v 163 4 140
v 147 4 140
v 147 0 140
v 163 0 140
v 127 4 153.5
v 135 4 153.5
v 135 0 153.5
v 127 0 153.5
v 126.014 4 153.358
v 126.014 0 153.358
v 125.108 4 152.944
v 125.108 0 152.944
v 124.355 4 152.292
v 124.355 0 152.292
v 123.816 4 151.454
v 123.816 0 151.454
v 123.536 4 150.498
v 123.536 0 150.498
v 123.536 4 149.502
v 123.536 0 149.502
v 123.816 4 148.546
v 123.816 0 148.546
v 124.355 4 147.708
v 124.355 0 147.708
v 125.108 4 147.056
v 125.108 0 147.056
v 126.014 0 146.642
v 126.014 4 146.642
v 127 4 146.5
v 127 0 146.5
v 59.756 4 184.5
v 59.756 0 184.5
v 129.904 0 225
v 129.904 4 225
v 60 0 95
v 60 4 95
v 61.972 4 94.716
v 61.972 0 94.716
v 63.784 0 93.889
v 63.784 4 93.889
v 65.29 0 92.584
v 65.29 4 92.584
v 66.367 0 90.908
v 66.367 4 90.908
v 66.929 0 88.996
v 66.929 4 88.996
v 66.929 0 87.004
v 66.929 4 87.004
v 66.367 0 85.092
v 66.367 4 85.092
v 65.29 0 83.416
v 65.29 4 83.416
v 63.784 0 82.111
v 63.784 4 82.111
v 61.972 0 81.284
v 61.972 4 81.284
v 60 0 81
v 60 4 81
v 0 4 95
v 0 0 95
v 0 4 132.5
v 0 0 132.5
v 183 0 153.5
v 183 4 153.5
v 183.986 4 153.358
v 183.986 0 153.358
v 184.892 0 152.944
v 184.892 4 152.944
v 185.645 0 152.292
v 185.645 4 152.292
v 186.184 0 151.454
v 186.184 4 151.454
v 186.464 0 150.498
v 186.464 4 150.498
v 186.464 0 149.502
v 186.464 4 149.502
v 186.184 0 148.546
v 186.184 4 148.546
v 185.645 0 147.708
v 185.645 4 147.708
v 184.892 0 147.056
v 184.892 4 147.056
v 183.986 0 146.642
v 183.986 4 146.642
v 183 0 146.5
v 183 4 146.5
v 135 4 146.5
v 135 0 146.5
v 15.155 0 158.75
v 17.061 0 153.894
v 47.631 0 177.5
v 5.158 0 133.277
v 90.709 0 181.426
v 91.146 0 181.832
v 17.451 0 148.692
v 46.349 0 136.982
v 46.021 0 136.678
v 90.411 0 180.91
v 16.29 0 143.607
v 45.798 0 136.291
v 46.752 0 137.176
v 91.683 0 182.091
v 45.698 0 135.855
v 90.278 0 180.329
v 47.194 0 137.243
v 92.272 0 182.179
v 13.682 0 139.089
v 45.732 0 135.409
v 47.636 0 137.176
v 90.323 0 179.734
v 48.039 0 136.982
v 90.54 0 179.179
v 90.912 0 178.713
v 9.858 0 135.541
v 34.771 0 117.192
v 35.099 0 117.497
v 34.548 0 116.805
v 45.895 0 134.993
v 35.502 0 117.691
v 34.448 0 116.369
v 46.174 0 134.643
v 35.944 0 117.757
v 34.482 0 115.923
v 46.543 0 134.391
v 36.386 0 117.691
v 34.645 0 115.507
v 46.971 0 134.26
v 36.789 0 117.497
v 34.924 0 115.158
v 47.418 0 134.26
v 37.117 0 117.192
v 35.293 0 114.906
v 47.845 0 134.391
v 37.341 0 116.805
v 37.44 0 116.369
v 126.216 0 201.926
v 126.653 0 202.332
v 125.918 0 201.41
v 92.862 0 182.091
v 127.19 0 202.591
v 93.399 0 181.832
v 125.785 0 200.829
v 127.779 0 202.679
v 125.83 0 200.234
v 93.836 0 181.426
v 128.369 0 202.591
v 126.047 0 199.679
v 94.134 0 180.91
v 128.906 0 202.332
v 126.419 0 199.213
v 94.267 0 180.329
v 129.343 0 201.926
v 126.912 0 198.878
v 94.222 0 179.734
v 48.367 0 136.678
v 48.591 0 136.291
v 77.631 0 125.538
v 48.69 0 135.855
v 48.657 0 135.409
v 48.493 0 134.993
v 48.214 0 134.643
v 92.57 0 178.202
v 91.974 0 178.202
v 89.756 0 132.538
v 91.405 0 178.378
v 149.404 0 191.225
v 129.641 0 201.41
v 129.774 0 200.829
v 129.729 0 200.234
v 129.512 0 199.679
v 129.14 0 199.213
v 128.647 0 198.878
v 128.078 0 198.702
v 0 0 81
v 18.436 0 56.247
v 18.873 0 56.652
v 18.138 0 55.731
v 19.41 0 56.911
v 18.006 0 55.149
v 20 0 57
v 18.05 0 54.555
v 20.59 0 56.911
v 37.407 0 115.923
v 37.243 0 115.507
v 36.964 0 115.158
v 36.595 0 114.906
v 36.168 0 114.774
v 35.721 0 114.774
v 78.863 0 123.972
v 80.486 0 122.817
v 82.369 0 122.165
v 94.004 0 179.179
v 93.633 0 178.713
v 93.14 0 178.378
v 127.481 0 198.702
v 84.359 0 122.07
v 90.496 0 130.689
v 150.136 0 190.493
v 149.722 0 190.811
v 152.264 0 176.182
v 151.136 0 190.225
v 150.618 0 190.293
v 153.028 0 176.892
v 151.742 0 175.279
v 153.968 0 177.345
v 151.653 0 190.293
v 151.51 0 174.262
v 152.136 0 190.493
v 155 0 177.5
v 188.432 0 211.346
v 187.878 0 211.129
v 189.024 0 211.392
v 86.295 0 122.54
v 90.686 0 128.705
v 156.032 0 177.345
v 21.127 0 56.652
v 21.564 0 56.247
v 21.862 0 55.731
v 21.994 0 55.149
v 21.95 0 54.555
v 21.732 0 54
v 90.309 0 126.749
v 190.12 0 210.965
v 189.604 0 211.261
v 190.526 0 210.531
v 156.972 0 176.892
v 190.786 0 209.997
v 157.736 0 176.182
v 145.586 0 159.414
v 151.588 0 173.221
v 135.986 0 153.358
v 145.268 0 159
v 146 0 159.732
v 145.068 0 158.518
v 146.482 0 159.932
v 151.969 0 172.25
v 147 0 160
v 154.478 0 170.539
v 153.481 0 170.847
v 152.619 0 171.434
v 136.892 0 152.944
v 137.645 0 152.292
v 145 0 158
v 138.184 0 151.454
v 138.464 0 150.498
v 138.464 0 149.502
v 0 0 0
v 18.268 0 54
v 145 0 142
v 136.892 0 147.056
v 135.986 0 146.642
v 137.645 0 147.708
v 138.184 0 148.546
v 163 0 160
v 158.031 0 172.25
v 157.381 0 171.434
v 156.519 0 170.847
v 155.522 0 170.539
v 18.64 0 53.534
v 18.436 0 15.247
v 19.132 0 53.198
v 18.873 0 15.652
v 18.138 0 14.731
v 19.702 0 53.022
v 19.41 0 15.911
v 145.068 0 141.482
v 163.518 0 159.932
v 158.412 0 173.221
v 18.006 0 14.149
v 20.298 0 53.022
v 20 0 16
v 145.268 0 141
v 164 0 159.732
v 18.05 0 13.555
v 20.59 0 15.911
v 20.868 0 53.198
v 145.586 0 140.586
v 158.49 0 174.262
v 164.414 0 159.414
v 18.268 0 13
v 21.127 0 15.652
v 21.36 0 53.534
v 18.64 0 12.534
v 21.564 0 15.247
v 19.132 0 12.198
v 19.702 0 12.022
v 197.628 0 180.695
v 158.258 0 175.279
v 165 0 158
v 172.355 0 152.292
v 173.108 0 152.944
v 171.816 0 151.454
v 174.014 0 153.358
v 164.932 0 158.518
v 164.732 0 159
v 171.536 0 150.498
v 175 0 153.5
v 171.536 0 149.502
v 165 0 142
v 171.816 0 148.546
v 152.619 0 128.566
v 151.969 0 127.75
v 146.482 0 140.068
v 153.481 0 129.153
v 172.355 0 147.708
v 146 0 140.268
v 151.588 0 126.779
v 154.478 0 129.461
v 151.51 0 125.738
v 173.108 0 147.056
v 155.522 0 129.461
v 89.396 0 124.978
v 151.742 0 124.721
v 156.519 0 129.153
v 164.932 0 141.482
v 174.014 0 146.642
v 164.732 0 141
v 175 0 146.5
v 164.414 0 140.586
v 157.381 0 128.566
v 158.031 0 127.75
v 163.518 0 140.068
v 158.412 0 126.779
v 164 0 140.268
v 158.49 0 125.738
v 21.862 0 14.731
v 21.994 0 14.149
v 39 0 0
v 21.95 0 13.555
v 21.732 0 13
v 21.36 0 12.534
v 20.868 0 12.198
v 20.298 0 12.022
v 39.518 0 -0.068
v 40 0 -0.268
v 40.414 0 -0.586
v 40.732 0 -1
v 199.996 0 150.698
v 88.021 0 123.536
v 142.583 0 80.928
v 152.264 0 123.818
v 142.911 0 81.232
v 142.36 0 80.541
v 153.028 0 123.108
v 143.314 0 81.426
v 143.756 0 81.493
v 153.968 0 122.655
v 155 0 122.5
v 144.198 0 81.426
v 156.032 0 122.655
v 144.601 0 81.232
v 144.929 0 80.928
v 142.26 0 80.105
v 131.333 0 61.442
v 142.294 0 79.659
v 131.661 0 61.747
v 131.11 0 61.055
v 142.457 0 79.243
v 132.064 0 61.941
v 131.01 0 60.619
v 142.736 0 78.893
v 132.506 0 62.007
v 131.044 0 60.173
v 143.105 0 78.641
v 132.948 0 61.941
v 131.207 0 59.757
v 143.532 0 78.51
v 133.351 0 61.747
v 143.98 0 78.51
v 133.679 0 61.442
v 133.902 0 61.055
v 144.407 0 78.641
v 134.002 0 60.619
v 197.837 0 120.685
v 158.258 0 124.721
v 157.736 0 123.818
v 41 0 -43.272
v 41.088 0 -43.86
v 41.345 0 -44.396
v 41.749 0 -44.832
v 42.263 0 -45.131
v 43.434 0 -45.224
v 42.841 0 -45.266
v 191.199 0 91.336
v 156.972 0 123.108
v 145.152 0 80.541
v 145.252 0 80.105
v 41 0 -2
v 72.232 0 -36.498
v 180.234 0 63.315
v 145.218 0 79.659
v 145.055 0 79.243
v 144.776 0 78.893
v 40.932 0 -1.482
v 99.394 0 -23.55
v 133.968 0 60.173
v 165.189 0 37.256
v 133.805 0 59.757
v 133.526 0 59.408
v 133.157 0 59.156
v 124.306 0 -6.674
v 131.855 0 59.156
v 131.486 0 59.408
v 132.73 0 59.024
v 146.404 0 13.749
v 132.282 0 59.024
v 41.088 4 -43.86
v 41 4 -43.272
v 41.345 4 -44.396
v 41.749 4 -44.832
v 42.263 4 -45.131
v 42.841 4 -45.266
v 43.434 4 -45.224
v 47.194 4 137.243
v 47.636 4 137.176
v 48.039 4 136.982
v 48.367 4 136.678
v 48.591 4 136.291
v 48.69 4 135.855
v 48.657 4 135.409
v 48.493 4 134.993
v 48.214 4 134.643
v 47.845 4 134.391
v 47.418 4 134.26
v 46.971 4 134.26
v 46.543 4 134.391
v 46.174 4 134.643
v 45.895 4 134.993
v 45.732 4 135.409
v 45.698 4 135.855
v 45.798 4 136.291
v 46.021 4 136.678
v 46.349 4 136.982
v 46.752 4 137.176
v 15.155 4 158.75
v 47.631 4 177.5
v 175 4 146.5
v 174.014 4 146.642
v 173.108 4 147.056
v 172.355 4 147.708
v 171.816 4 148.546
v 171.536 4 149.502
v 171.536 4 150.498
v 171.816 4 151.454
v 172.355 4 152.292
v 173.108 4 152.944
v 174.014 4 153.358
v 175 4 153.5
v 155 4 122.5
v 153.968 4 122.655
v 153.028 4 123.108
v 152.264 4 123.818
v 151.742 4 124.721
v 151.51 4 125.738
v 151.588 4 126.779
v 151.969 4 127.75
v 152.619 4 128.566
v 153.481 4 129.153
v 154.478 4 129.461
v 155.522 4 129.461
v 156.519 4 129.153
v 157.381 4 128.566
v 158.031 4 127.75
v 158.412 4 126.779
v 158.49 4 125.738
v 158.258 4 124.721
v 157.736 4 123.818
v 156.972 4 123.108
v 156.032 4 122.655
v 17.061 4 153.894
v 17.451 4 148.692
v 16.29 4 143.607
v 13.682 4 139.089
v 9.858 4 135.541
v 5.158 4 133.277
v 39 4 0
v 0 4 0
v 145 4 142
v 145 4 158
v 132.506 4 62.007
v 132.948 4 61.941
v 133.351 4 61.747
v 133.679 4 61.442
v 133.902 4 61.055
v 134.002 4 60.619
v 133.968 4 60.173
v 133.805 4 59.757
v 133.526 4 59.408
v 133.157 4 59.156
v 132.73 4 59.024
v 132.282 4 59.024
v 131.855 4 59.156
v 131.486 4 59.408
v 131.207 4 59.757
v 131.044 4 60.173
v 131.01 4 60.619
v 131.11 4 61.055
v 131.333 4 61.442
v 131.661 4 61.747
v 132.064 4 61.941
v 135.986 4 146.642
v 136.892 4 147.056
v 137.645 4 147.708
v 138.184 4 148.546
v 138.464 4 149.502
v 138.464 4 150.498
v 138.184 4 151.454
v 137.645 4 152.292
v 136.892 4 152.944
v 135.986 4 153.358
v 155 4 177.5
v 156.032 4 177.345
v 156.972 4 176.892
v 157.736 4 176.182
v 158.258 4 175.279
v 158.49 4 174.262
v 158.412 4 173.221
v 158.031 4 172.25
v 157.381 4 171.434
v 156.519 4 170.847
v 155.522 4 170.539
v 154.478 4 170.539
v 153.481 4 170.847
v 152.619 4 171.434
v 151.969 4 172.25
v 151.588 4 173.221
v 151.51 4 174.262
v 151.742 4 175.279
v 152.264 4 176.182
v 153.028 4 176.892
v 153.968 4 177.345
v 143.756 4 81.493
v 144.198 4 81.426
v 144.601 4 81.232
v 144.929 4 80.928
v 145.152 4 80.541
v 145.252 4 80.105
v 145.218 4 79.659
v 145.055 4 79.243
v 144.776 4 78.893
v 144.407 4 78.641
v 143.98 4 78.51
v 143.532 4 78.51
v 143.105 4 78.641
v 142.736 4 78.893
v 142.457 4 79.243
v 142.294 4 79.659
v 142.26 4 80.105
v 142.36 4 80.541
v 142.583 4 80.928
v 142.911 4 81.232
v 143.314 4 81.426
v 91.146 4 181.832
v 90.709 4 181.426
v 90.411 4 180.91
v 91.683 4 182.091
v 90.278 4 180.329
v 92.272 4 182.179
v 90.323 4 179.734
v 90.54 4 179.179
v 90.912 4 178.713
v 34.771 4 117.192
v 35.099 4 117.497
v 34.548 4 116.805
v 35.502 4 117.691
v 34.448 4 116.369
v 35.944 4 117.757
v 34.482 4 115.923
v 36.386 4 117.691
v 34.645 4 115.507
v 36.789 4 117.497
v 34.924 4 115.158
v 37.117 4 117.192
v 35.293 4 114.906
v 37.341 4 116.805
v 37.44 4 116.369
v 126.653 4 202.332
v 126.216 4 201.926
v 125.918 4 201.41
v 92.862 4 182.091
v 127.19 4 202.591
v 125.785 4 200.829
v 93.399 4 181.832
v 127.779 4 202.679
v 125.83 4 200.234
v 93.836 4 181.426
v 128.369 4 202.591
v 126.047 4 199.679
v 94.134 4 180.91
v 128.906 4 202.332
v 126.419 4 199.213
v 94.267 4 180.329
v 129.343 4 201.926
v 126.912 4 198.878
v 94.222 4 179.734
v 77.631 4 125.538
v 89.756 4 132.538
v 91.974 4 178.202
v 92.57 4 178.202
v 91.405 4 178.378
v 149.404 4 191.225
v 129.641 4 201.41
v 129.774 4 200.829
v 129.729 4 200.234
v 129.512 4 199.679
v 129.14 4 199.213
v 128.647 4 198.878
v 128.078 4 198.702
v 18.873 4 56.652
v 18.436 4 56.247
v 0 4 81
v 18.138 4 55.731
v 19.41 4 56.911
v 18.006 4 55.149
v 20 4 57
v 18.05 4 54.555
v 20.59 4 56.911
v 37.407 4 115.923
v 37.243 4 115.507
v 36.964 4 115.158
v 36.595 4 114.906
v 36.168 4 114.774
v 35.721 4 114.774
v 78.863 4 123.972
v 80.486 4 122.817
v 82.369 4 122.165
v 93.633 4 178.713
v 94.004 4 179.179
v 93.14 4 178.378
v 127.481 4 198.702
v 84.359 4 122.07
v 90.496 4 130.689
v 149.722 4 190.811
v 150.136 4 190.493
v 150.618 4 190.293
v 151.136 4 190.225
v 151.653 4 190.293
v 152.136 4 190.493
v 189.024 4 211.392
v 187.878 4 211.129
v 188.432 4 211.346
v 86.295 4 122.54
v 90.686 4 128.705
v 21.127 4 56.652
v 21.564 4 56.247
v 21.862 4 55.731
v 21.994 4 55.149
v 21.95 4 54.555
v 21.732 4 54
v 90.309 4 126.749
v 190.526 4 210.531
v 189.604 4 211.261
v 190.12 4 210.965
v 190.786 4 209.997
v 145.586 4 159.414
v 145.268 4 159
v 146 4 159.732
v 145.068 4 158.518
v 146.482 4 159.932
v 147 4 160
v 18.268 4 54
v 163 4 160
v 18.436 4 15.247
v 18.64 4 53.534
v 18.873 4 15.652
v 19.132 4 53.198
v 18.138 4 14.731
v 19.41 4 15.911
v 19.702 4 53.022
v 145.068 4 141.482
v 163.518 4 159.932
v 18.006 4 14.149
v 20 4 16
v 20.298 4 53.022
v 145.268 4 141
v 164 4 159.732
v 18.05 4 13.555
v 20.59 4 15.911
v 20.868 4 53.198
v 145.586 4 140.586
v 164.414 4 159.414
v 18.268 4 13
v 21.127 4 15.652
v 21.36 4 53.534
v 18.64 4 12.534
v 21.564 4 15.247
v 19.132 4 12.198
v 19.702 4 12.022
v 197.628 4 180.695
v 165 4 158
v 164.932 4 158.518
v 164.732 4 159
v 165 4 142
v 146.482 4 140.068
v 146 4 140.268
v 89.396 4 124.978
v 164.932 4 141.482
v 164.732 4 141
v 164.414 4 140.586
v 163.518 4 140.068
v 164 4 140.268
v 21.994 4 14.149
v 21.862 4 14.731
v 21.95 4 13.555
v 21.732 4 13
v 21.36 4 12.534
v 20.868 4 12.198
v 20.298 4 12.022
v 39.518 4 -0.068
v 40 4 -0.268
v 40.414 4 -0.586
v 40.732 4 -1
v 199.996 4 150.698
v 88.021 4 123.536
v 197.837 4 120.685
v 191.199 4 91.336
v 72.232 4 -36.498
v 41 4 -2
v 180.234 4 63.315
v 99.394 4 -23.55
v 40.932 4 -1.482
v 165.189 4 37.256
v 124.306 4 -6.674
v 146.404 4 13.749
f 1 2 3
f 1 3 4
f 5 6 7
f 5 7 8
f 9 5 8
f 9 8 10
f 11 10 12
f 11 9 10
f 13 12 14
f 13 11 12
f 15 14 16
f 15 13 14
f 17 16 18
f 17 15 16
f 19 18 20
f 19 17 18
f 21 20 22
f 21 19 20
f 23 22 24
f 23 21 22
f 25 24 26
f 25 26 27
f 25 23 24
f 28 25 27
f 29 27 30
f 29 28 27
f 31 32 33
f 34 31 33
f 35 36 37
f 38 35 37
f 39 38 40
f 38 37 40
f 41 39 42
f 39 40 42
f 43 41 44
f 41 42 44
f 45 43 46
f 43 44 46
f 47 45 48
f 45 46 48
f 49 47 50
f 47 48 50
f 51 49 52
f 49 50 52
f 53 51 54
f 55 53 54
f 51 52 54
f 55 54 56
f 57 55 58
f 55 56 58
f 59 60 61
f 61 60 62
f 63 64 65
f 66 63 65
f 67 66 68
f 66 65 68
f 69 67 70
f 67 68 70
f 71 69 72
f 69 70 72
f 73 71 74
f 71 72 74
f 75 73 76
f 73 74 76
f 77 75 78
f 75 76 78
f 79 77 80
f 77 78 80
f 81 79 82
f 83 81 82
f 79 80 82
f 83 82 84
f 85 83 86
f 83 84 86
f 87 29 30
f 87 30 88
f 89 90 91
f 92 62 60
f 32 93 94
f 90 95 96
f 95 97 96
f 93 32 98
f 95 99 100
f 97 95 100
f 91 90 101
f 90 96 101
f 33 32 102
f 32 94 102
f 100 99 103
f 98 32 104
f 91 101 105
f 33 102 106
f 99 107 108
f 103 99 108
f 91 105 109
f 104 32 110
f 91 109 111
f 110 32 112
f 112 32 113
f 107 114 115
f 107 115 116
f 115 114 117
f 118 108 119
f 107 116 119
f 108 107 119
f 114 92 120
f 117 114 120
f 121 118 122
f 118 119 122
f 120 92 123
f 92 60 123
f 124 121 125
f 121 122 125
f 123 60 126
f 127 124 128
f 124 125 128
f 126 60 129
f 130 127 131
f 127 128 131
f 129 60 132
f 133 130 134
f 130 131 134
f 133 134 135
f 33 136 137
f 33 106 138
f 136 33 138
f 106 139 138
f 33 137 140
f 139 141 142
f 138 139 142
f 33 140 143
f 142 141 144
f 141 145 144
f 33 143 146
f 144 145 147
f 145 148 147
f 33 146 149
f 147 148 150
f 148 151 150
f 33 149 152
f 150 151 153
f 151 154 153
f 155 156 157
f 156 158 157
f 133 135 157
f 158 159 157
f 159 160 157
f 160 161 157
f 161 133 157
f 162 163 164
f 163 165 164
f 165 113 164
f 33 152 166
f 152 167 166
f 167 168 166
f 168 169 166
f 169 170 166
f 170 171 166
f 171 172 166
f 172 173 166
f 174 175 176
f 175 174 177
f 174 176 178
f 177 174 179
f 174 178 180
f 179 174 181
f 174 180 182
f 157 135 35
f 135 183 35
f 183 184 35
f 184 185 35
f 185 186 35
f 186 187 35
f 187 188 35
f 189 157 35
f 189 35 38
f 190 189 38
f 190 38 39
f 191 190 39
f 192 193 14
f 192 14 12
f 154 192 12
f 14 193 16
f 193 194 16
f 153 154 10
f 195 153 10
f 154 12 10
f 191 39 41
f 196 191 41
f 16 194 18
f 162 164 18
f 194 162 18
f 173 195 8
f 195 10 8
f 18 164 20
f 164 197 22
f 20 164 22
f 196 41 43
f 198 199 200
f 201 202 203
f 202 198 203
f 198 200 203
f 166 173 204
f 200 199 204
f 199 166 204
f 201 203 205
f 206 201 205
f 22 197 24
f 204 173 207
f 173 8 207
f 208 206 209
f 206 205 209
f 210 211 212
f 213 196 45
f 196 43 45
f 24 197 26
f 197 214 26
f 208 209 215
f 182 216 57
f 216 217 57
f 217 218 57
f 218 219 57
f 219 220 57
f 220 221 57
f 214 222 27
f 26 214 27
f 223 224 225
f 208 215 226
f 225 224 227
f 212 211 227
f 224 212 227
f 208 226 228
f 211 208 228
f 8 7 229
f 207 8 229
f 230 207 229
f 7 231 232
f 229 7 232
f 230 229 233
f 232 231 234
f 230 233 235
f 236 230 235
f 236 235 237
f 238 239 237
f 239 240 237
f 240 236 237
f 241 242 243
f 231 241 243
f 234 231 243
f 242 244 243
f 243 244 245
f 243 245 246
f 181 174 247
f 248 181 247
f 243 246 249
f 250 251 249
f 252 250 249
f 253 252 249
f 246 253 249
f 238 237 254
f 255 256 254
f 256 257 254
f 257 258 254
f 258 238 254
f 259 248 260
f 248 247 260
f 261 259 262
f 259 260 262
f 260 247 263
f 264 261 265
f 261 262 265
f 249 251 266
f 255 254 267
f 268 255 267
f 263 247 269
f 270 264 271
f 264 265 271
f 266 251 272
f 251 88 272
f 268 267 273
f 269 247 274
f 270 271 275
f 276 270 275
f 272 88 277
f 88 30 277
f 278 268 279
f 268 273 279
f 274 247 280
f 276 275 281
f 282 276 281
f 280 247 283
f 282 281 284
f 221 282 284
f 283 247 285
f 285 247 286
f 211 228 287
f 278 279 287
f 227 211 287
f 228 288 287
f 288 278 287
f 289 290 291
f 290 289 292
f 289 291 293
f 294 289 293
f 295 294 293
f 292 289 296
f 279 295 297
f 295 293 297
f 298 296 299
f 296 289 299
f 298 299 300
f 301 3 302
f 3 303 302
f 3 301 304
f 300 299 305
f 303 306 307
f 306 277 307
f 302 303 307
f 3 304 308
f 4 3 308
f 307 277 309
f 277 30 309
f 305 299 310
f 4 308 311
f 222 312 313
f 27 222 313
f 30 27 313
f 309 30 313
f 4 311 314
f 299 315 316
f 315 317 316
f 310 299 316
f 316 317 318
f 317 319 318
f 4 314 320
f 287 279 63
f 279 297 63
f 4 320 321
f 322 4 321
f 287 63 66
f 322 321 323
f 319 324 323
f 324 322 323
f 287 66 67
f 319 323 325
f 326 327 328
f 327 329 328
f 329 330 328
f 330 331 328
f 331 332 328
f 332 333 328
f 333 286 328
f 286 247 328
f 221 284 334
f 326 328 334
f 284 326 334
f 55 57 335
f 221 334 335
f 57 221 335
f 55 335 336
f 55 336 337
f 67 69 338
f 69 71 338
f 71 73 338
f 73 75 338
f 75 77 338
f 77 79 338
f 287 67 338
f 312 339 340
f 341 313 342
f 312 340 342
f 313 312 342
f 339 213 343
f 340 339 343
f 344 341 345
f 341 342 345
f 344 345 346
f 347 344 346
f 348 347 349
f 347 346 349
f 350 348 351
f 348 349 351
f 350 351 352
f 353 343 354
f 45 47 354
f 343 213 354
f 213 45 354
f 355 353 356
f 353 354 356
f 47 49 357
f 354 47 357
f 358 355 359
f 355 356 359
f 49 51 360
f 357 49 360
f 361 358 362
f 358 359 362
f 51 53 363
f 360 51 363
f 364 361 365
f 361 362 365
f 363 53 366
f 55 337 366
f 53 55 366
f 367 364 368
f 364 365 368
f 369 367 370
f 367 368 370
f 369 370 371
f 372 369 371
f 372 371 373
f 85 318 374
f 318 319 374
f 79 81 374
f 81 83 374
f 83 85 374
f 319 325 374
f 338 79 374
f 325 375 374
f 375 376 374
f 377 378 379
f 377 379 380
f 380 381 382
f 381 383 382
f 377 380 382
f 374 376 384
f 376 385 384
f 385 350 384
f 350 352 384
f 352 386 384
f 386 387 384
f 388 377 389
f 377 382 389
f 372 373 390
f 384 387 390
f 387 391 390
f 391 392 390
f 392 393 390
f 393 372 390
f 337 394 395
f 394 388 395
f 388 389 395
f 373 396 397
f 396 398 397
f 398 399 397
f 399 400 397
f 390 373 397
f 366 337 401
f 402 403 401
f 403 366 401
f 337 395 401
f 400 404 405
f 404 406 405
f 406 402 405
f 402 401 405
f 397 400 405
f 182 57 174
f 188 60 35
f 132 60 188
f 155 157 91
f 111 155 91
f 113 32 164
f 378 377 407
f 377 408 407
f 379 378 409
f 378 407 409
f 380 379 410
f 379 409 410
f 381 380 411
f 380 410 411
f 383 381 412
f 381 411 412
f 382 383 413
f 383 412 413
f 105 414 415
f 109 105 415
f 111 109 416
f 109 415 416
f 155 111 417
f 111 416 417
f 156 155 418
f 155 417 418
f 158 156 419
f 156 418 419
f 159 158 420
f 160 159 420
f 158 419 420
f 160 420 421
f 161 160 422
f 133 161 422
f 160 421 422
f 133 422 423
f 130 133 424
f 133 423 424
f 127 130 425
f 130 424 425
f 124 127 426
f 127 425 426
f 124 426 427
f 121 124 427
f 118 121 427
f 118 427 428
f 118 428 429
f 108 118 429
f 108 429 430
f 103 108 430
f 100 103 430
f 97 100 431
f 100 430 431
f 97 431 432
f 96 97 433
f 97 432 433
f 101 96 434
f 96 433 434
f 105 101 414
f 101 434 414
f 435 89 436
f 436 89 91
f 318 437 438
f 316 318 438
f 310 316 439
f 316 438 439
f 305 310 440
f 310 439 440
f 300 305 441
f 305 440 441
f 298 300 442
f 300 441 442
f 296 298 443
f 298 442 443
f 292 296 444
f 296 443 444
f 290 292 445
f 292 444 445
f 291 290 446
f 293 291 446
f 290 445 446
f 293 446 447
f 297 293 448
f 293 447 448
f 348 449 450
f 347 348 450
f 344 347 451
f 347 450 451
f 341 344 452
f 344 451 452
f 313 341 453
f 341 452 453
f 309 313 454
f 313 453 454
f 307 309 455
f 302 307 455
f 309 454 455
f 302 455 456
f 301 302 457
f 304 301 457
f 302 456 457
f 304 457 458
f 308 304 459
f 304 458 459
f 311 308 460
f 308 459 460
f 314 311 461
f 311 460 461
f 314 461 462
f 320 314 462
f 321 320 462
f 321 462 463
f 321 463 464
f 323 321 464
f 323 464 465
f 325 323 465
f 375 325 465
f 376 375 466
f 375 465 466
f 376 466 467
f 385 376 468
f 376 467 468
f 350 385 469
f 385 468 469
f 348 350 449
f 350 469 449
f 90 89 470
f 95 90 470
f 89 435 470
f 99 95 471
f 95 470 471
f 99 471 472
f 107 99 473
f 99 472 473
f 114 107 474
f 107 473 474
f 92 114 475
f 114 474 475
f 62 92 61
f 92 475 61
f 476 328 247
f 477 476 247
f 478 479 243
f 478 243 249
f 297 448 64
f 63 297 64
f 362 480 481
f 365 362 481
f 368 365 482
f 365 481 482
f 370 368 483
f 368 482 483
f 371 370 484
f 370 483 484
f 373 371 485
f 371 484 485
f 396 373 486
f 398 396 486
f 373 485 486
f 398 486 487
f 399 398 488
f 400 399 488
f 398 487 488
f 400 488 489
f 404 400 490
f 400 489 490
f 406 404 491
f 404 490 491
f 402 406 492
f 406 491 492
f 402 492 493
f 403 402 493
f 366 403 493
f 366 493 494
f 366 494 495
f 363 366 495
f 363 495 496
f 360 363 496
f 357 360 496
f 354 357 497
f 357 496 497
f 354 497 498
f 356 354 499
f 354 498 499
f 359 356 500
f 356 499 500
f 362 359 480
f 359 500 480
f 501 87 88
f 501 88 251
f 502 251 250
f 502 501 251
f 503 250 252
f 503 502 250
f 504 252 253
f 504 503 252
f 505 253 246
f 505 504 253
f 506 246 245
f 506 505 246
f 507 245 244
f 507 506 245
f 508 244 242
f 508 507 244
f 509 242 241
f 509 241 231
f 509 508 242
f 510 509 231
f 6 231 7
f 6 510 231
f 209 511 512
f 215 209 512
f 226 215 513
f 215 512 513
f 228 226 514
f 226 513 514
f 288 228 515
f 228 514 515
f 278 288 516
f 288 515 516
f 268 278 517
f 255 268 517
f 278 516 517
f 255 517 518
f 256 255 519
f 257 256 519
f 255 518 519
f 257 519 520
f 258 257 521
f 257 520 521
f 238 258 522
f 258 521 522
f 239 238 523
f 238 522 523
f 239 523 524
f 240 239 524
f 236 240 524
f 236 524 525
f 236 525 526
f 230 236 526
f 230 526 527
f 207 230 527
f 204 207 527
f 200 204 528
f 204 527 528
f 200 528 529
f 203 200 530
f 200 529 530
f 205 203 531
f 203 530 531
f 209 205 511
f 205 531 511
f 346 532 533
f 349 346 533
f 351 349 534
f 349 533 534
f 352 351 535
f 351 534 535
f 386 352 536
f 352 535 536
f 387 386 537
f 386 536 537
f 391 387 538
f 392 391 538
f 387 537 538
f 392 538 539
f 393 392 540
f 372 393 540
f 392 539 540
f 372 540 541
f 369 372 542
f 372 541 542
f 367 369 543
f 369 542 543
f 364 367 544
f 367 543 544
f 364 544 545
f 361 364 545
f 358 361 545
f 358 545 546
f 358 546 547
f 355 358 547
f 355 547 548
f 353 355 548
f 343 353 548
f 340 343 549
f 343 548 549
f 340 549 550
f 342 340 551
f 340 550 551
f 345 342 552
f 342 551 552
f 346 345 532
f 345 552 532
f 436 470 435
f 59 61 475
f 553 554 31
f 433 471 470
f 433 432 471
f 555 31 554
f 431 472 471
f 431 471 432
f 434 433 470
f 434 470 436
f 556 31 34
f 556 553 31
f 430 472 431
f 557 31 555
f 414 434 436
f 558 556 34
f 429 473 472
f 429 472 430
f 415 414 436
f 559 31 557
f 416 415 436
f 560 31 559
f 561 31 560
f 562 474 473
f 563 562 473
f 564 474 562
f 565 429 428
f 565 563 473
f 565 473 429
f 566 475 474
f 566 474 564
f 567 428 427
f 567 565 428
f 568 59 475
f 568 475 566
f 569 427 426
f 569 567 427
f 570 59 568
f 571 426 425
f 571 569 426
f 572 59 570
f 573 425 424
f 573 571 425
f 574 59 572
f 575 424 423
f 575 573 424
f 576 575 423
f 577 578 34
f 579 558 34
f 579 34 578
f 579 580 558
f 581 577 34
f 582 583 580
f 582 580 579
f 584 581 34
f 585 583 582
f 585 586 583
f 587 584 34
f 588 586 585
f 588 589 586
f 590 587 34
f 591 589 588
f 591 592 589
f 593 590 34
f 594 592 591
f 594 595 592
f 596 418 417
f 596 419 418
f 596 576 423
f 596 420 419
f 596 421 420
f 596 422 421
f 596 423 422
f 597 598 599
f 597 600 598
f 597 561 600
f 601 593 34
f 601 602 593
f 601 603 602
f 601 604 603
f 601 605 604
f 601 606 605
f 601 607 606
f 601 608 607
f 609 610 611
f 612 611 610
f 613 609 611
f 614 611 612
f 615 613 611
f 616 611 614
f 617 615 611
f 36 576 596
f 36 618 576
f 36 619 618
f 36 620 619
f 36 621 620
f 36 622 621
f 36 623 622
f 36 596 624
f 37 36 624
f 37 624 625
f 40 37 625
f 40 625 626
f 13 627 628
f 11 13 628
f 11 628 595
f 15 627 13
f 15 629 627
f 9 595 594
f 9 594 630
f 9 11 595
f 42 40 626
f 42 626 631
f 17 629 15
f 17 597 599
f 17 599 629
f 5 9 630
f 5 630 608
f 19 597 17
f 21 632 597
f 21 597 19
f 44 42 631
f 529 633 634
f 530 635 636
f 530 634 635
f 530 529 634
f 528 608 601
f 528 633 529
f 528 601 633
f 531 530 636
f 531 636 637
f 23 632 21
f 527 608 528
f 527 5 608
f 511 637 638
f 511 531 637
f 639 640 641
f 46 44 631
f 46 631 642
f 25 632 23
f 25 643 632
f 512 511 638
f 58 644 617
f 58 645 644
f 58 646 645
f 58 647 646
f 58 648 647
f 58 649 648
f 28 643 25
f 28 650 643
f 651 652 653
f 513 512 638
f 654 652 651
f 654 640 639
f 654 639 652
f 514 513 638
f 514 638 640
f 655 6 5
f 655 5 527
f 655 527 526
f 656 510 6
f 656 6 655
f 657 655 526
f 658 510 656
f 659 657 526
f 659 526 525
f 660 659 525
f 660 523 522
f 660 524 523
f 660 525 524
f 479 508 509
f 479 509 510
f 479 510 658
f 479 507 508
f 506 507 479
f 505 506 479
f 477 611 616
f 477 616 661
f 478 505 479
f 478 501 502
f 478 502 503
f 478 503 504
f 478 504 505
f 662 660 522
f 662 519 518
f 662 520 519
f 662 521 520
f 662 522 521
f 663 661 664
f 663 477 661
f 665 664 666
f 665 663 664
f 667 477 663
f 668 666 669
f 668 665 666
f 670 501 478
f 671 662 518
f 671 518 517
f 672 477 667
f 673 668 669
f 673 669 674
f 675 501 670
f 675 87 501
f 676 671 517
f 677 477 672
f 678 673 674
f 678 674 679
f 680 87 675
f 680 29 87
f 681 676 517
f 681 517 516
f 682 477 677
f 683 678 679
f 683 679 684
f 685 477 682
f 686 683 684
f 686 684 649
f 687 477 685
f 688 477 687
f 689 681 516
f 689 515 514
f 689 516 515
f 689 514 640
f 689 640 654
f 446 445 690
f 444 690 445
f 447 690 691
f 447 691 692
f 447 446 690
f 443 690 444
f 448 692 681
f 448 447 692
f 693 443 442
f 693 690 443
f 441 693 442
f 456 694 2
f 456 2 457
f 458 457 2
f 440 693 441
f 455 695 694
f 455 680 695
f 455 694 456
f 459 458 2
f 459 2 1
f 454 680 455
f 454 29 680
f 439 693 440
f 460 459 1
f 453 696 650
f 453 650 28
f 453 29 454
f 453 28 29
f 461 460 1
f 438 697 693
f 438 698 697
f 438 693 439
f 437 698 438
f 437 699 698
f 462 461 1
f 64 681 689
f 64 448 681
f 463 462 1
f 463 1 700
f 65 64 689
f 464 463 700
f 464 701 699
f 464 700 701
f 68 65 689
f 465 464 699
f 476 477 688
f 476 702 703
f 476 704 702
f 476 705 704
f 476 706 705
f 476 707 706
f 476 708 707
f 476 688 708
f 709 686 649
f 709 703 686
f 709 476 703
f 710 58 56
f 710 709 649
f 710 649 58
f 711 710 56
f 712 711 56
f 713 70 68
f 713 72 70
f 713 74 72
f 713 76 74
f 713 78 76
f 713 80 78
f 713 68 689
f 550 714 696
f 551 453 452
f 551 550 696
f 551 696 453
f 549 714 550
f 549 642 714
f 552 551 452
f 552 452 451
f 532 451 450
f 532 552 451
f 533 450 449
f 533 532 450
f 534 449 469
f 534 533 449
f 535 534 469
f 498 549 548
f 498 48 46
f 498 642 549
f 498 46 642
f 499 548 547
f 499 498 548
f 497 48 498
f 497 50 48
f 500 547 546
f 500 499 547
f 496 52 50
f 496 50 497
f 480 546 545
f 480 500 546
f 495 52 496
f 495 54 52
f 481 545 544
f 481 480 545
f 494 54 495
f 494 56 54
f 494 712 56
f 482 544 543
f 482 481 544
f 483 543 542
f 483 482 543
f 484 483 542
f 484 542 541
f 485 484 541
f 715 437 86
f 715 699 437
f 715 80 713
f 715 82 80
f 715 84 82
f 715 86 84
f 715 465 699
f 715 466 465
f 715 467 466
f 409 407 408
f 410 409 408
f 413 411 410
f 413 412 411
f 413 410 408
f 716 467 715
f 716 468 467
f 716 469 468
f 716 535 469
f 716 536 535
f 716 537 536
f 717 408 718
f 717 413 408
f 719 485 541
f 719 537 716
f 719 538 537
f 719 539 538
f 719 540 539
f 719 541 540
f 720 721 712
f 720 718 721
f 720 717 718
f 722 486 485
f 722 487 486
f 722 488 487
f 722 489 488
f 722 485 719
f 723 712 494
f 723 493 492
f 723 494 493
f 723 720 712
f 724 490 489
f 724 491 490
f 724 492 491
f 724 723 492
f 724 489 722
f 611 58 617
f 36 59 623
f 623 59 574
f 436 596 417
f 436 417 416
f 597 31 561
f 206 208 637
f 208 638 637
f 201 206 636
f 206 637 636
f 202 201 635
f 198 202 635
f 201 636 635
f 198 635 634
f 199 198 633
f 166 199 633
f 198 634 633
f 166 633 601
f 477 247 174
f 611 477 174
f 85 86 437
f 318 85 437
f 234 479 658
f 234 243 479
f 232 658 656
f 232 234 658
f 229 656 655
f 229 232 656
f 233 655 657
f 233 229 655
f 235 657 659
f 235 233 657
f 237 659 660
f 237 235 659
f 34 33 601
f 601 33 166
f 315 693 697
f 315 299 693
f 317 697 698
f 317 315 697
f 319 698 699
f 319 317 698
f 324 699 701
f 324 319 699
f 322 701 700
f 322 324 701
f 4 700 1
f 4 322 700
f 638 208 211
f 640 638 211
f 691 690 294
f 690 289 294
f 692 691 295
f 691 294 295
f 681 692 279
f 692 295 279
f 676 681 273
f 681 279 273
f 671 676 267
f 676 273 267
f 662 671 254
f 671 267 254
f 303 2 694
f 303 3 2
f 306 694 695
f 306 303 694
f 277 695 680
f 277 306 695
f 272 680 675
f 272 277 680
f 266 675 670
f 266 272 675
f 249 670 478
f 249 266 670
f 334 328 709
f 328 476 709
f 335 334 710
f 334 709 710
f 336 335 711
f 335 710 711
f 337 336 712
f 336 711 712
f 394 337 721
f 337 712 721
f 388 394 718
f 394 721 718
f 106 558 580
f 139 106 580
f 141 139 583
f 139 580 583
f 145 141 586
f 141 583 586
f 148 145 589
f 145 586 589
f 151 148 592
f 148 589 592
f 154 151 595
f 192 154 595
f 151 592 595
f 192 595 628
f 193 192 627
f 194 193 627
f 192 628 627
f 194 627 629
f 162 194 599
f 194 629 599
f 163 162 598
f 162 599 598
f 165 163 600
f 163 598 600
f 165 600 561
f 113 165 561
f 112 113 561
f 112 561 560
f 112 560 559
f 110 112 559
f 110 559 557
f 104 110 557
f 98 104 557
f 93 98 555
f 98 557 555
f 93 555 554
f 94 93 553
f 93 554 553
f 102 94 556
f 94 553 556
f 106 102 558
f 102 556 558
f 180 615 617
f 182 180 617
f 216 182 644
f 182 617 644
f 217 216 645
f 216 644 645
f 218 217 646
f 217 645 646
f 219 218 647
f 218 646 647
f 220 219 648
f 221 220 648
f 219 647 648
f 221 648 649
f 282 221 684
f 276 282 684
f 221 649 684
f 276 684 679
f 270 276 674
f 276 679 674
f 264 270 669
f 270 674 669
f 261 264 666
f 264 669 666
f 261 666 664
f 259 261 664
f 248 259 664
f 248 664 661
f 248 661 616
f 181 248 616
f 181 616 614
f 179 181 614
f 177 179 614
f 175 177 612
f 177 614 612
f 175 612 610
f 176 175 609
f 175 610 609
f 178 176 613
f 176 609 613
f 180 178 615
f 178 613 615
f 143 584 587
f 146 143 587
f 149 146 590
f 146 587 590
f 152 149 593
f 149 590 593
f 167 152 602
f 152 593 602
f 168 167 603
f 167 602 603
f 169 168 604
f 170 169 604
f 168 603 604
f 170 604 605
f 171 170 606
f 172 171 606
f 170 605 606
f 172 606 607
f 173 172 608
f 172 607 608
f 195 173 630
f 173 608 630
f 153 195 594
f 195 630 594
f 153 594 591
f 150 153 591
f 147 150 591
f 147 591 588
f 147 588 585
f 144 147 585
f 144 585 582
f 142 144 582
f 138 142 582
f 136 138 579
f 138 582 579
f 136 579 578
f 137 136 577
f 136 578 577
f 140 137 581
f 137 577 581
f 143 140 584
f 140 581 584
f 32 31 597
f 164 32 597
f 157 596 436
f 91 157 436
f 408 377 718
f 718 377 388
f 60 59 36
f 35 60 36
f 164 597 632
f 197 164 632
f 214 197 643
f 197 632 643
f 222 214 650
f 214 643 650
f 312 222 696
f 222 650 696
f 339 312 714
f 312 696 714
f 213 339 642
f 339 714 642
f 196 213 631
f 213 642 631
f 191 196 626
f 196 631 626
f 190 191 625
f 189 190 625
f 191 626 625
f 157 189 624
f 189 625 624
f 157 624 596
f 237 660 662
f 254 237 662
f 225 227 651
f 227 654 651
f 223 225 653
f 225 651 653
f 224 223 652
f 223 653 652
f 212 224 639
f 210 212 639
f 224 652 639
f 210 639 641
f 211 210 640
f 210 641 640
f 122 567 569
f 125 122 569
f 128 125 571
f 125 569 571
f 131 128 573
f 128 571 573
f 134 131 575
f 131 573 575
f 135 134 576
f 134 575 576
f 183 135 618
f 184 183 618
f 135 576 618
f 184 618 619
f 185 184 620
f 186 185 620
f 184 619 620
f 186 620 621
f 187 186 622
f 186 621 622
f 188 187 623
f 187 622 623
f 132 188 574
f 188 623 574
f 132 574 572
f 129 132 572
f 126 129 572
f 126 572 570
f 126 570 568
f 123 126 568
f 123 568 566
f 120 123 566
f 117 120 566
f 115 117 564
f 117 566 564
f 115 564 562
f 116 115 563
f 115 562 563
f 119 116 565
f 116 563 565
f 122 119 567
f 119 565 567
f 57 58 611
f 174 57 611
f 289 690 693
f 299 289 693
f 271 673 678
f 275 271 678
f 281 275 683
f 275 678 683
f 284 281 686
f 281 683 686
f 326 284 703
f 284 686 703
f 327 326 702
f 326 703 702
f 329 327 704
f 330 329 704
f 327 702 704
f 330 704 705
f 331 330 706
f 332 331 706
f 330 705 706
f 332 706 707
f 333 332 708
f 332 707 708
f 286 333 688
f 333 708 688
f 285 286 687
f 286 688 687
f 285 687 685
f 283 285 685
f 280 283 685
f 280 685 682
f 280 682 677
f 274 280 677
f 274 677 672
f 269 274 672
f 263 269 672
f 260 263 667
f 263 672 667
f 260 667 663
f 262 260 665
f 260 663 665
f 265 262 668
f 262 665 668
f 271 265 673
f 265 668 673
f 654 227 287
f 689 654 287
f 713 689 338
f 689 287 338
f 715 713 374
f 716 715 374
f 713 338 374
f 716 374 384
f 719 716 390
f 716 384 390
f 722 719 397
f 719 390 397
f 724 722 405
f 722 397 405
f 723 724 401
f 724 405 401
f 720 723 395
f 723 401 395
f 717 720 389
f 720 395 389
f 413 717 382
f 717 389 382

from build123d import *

# Parameters (mm, degrees)
BOSS_EXTRUDE1_DEPTH = 4
SKETCH2_R           = 2
CUT_EXTRUDE1_DEPTH  = 4
SKETCH3_R           = 1.5
CUT_EXTRUDE2_DEPTH  = 4
CUT_EXTRUDE3_DEPTH  = 4
SKETCH5_R           = 2
CUT_EXTRUDE4_DEPTH  = 4
SKETCH6_R           = 3.5
SKETCH6_W           = 20
SKETCH6_H           = 20
CUT_EXTRUDE5_DEPTH  = 4
CUT_EXTRUDE6_DEPTH  = 4
SKETCH9_R           = 17.5
CUT_EXTRUDE7_DEPTH  = 4
FILLET1_R           = 2


with BuildPart() as part:
    # Sketch1 → Boss-Extrude1 (new body)
    with BuildSketch(Plane(origin=(0, 0, 0), x_dir=(1, 0, 0), z_dir=(0, 1, 0))):
        with BuildLine():
            Line((0, 0), (0, -150))
            Line((0, -150), (129.903810568, -225))
            Line((129.903810568, -225), (150.403810568, -189.492958445))
            Line((150.403810568, -189.492958445), (190.024472791, -212.367958445))
            ThreePointArc((190.024472791, -212.367958445), (173.202037288, -50.001757147), (41, 45.75))
            Line((41, 45.75), (41, 0))
            Line((41, 0), (0, 0))
        make_face()
    extrude(amount=BOSS_EXTRUDE1_DEPTH)

    # Sketch2 → Cut-Extrude1 (cut)
    with BuildSketch(Plane(origin=(0, 4, 0), x_dir=(1, 0, 0), z_dir=(0, 1, 0))):
        with Locations(Location((20, -14, 0), (0, 0, 270))):
            Circle(SKETCH2_R)
        with Locations(Location((20, -55, 0), (0, 0, 270))):
            Circle(SKETCH2_R)
    extrude(amount=-CUT_EXTRUDE1_DEPTH, mode=Mode.SUBTRACT)

    # Sketch3 → Cut-Extrude2 (cut)
    with BuildSketch(Plane(origin=(0, 4, 0), x_dir=(1, 0, 0), z_dir=(0, 1, 0))):
        with Locations(Location((143.756051904, -79.992785793, 0), (0, 0, 270))):
            Circle(SKETCH3_R)
        with Locations(Location((132.506051904, -60.507214207, 0), (0, 0, 270))):
            Circle(SKETCH3_R)
        with Locations(Location((47.194219382, -135.742785793, 0), (0, 0, 270))):
            Circle(SKETCH3_R)
        with Locations(Location((35.944219382, -116.257214207, 0), (0, 0, 270))):
            Circle(SKETCH3_R)
    extrude(amount=-CUT_EXTRUDE2_DEPTH, mode=Mode.SUBTRACT)

    # Sketch4 → Cut-Extrude3 (cut)
    with BuildSketch(Plane(origin=(0, 4, 0), x_dir=(1, 0, 0), z_dir=(0, 1, 0))):
        with BuildLine():
            Line((0, -81), (0, -95))
            Line((0, -95), (60, -95))
            ThreePointArc((60, -95), (67, -88), (60, -81))
            Line((60, -81), (0, -81))
        make_face()
    extrude(amount=-CUT_EXTRUDE3_DEPTH, mode=Mode.SUBTRACT)

    # Sketch5 → Cut-Extrude4 (cut)
    with BuildSketch(Plane(origin=(0, 4, 0), x_dir=(1, 0, 0), z_dir=(0, 1, 0))):
        with Locations(Location((127.779454915, -200.679491924, 0), (0, 0, 270))):
            Circle(SKETCH5_R)
        with Locations(Location((92.27241336, -180.179491924, 0), (0, 0, 270))):
            Circle(SKETCH5_R)
    extrude(amount=-CUT_EXTRUDE4_DEPTH, mode=Mode.SUBTRACT)

    # Sketch6 → Cut-Extrude5 (cut)
    with BuildSketch(Plane(origin=(0, 4, 0), x_dir=(1, 0, 0), z_dir=(0, 1, 0))):
        with Locations(Location((155, -174, 0), (0, 0, 270))):
            Circle(SKETCH6_R)
        with Locations(Location((155, -126, 0), (0, 0, 90))):
            Circle(SKETCH6_R)
        with Locations((155, -150)):
            Rectangle(SKETCH6_W, SKETCH6_H)
        with BuildLine():
            Line((127, -146.5), (135, -146.5))
            ThreePointArc((135, -146.5), (138.5, -150), (135, -153.5))
            Line((135, -153.5), (127, -153.5))
            ThreePointArc((127, -153.5), (123.5, -150), (127, -146.5))
        make_face()
        with BuildLine():
            Line((183, -146.5), (175, -146.5))
            ThreePointArc((175, -146.5), (171.5, -150), (175, -153.5))
            Line((175, -153.5), (183, -153.5))
            ThreePointArc((183, -153.5), (186.5, -150), (183, -146.5))
        make_face()
    extrude(amount=-CUT_EXTRUDE5_DEPTH, mode=Mode.SUBTRACT)

    # Sketch8 → Cut-Extrude6 (cut)
    with BuildSketch(Plane(origin=(0, 4, 0), x_dir=(1, 0, 0), z_dir=(0, 1, 0))):
        with BuildLine():
            Line((47.631397208, -177.5), (59.755752861, -184.5))
            Line((59.755752861, -184.5), (89.755752861, -132.538475773))
            ThreePointArc((89.755752861, -132.538475773), (87.193575035, -122.976297946), (77.631397208, -125.538475773))
            Line((77.631397208, -125.538475773), (47.631397208, -177.5))
        make_face()
    extrude(amount=-CUT_EXTRUDE6_DEPTH, mode=Mode.SUBTRACT)

    # Sketch9 → Cut-Extrude7 (cut)
    with BuildSketch(Plane(origin=(0, 4, 0), x_dir=(1, 0, 0), z_dir=(0, 1, 0))):
        with Locations((0, -150)):
            Circle(SKETCH9_R)
    extrude(amount=-CUT_EXTRUDE7_DEPTH, mode=Mode.SUBTRACT)

    # Fillet1
    fillet1_edges = [part.edges().sort_by_distance(p)[0] for p in [
        (165, 2, 160),
        (165, 2, 140),
        (145, 2, 140),
        (145, 2, 160),
        (41, 2, 0),
        (41, 2, -45.75),
        (190.024472791, 2, 212.367958445),
        (150.403810568, 2, 189.492958445),
    ]]
    fillet(fillet1_edges, radius=FILLET1_R)


solid = part.part
